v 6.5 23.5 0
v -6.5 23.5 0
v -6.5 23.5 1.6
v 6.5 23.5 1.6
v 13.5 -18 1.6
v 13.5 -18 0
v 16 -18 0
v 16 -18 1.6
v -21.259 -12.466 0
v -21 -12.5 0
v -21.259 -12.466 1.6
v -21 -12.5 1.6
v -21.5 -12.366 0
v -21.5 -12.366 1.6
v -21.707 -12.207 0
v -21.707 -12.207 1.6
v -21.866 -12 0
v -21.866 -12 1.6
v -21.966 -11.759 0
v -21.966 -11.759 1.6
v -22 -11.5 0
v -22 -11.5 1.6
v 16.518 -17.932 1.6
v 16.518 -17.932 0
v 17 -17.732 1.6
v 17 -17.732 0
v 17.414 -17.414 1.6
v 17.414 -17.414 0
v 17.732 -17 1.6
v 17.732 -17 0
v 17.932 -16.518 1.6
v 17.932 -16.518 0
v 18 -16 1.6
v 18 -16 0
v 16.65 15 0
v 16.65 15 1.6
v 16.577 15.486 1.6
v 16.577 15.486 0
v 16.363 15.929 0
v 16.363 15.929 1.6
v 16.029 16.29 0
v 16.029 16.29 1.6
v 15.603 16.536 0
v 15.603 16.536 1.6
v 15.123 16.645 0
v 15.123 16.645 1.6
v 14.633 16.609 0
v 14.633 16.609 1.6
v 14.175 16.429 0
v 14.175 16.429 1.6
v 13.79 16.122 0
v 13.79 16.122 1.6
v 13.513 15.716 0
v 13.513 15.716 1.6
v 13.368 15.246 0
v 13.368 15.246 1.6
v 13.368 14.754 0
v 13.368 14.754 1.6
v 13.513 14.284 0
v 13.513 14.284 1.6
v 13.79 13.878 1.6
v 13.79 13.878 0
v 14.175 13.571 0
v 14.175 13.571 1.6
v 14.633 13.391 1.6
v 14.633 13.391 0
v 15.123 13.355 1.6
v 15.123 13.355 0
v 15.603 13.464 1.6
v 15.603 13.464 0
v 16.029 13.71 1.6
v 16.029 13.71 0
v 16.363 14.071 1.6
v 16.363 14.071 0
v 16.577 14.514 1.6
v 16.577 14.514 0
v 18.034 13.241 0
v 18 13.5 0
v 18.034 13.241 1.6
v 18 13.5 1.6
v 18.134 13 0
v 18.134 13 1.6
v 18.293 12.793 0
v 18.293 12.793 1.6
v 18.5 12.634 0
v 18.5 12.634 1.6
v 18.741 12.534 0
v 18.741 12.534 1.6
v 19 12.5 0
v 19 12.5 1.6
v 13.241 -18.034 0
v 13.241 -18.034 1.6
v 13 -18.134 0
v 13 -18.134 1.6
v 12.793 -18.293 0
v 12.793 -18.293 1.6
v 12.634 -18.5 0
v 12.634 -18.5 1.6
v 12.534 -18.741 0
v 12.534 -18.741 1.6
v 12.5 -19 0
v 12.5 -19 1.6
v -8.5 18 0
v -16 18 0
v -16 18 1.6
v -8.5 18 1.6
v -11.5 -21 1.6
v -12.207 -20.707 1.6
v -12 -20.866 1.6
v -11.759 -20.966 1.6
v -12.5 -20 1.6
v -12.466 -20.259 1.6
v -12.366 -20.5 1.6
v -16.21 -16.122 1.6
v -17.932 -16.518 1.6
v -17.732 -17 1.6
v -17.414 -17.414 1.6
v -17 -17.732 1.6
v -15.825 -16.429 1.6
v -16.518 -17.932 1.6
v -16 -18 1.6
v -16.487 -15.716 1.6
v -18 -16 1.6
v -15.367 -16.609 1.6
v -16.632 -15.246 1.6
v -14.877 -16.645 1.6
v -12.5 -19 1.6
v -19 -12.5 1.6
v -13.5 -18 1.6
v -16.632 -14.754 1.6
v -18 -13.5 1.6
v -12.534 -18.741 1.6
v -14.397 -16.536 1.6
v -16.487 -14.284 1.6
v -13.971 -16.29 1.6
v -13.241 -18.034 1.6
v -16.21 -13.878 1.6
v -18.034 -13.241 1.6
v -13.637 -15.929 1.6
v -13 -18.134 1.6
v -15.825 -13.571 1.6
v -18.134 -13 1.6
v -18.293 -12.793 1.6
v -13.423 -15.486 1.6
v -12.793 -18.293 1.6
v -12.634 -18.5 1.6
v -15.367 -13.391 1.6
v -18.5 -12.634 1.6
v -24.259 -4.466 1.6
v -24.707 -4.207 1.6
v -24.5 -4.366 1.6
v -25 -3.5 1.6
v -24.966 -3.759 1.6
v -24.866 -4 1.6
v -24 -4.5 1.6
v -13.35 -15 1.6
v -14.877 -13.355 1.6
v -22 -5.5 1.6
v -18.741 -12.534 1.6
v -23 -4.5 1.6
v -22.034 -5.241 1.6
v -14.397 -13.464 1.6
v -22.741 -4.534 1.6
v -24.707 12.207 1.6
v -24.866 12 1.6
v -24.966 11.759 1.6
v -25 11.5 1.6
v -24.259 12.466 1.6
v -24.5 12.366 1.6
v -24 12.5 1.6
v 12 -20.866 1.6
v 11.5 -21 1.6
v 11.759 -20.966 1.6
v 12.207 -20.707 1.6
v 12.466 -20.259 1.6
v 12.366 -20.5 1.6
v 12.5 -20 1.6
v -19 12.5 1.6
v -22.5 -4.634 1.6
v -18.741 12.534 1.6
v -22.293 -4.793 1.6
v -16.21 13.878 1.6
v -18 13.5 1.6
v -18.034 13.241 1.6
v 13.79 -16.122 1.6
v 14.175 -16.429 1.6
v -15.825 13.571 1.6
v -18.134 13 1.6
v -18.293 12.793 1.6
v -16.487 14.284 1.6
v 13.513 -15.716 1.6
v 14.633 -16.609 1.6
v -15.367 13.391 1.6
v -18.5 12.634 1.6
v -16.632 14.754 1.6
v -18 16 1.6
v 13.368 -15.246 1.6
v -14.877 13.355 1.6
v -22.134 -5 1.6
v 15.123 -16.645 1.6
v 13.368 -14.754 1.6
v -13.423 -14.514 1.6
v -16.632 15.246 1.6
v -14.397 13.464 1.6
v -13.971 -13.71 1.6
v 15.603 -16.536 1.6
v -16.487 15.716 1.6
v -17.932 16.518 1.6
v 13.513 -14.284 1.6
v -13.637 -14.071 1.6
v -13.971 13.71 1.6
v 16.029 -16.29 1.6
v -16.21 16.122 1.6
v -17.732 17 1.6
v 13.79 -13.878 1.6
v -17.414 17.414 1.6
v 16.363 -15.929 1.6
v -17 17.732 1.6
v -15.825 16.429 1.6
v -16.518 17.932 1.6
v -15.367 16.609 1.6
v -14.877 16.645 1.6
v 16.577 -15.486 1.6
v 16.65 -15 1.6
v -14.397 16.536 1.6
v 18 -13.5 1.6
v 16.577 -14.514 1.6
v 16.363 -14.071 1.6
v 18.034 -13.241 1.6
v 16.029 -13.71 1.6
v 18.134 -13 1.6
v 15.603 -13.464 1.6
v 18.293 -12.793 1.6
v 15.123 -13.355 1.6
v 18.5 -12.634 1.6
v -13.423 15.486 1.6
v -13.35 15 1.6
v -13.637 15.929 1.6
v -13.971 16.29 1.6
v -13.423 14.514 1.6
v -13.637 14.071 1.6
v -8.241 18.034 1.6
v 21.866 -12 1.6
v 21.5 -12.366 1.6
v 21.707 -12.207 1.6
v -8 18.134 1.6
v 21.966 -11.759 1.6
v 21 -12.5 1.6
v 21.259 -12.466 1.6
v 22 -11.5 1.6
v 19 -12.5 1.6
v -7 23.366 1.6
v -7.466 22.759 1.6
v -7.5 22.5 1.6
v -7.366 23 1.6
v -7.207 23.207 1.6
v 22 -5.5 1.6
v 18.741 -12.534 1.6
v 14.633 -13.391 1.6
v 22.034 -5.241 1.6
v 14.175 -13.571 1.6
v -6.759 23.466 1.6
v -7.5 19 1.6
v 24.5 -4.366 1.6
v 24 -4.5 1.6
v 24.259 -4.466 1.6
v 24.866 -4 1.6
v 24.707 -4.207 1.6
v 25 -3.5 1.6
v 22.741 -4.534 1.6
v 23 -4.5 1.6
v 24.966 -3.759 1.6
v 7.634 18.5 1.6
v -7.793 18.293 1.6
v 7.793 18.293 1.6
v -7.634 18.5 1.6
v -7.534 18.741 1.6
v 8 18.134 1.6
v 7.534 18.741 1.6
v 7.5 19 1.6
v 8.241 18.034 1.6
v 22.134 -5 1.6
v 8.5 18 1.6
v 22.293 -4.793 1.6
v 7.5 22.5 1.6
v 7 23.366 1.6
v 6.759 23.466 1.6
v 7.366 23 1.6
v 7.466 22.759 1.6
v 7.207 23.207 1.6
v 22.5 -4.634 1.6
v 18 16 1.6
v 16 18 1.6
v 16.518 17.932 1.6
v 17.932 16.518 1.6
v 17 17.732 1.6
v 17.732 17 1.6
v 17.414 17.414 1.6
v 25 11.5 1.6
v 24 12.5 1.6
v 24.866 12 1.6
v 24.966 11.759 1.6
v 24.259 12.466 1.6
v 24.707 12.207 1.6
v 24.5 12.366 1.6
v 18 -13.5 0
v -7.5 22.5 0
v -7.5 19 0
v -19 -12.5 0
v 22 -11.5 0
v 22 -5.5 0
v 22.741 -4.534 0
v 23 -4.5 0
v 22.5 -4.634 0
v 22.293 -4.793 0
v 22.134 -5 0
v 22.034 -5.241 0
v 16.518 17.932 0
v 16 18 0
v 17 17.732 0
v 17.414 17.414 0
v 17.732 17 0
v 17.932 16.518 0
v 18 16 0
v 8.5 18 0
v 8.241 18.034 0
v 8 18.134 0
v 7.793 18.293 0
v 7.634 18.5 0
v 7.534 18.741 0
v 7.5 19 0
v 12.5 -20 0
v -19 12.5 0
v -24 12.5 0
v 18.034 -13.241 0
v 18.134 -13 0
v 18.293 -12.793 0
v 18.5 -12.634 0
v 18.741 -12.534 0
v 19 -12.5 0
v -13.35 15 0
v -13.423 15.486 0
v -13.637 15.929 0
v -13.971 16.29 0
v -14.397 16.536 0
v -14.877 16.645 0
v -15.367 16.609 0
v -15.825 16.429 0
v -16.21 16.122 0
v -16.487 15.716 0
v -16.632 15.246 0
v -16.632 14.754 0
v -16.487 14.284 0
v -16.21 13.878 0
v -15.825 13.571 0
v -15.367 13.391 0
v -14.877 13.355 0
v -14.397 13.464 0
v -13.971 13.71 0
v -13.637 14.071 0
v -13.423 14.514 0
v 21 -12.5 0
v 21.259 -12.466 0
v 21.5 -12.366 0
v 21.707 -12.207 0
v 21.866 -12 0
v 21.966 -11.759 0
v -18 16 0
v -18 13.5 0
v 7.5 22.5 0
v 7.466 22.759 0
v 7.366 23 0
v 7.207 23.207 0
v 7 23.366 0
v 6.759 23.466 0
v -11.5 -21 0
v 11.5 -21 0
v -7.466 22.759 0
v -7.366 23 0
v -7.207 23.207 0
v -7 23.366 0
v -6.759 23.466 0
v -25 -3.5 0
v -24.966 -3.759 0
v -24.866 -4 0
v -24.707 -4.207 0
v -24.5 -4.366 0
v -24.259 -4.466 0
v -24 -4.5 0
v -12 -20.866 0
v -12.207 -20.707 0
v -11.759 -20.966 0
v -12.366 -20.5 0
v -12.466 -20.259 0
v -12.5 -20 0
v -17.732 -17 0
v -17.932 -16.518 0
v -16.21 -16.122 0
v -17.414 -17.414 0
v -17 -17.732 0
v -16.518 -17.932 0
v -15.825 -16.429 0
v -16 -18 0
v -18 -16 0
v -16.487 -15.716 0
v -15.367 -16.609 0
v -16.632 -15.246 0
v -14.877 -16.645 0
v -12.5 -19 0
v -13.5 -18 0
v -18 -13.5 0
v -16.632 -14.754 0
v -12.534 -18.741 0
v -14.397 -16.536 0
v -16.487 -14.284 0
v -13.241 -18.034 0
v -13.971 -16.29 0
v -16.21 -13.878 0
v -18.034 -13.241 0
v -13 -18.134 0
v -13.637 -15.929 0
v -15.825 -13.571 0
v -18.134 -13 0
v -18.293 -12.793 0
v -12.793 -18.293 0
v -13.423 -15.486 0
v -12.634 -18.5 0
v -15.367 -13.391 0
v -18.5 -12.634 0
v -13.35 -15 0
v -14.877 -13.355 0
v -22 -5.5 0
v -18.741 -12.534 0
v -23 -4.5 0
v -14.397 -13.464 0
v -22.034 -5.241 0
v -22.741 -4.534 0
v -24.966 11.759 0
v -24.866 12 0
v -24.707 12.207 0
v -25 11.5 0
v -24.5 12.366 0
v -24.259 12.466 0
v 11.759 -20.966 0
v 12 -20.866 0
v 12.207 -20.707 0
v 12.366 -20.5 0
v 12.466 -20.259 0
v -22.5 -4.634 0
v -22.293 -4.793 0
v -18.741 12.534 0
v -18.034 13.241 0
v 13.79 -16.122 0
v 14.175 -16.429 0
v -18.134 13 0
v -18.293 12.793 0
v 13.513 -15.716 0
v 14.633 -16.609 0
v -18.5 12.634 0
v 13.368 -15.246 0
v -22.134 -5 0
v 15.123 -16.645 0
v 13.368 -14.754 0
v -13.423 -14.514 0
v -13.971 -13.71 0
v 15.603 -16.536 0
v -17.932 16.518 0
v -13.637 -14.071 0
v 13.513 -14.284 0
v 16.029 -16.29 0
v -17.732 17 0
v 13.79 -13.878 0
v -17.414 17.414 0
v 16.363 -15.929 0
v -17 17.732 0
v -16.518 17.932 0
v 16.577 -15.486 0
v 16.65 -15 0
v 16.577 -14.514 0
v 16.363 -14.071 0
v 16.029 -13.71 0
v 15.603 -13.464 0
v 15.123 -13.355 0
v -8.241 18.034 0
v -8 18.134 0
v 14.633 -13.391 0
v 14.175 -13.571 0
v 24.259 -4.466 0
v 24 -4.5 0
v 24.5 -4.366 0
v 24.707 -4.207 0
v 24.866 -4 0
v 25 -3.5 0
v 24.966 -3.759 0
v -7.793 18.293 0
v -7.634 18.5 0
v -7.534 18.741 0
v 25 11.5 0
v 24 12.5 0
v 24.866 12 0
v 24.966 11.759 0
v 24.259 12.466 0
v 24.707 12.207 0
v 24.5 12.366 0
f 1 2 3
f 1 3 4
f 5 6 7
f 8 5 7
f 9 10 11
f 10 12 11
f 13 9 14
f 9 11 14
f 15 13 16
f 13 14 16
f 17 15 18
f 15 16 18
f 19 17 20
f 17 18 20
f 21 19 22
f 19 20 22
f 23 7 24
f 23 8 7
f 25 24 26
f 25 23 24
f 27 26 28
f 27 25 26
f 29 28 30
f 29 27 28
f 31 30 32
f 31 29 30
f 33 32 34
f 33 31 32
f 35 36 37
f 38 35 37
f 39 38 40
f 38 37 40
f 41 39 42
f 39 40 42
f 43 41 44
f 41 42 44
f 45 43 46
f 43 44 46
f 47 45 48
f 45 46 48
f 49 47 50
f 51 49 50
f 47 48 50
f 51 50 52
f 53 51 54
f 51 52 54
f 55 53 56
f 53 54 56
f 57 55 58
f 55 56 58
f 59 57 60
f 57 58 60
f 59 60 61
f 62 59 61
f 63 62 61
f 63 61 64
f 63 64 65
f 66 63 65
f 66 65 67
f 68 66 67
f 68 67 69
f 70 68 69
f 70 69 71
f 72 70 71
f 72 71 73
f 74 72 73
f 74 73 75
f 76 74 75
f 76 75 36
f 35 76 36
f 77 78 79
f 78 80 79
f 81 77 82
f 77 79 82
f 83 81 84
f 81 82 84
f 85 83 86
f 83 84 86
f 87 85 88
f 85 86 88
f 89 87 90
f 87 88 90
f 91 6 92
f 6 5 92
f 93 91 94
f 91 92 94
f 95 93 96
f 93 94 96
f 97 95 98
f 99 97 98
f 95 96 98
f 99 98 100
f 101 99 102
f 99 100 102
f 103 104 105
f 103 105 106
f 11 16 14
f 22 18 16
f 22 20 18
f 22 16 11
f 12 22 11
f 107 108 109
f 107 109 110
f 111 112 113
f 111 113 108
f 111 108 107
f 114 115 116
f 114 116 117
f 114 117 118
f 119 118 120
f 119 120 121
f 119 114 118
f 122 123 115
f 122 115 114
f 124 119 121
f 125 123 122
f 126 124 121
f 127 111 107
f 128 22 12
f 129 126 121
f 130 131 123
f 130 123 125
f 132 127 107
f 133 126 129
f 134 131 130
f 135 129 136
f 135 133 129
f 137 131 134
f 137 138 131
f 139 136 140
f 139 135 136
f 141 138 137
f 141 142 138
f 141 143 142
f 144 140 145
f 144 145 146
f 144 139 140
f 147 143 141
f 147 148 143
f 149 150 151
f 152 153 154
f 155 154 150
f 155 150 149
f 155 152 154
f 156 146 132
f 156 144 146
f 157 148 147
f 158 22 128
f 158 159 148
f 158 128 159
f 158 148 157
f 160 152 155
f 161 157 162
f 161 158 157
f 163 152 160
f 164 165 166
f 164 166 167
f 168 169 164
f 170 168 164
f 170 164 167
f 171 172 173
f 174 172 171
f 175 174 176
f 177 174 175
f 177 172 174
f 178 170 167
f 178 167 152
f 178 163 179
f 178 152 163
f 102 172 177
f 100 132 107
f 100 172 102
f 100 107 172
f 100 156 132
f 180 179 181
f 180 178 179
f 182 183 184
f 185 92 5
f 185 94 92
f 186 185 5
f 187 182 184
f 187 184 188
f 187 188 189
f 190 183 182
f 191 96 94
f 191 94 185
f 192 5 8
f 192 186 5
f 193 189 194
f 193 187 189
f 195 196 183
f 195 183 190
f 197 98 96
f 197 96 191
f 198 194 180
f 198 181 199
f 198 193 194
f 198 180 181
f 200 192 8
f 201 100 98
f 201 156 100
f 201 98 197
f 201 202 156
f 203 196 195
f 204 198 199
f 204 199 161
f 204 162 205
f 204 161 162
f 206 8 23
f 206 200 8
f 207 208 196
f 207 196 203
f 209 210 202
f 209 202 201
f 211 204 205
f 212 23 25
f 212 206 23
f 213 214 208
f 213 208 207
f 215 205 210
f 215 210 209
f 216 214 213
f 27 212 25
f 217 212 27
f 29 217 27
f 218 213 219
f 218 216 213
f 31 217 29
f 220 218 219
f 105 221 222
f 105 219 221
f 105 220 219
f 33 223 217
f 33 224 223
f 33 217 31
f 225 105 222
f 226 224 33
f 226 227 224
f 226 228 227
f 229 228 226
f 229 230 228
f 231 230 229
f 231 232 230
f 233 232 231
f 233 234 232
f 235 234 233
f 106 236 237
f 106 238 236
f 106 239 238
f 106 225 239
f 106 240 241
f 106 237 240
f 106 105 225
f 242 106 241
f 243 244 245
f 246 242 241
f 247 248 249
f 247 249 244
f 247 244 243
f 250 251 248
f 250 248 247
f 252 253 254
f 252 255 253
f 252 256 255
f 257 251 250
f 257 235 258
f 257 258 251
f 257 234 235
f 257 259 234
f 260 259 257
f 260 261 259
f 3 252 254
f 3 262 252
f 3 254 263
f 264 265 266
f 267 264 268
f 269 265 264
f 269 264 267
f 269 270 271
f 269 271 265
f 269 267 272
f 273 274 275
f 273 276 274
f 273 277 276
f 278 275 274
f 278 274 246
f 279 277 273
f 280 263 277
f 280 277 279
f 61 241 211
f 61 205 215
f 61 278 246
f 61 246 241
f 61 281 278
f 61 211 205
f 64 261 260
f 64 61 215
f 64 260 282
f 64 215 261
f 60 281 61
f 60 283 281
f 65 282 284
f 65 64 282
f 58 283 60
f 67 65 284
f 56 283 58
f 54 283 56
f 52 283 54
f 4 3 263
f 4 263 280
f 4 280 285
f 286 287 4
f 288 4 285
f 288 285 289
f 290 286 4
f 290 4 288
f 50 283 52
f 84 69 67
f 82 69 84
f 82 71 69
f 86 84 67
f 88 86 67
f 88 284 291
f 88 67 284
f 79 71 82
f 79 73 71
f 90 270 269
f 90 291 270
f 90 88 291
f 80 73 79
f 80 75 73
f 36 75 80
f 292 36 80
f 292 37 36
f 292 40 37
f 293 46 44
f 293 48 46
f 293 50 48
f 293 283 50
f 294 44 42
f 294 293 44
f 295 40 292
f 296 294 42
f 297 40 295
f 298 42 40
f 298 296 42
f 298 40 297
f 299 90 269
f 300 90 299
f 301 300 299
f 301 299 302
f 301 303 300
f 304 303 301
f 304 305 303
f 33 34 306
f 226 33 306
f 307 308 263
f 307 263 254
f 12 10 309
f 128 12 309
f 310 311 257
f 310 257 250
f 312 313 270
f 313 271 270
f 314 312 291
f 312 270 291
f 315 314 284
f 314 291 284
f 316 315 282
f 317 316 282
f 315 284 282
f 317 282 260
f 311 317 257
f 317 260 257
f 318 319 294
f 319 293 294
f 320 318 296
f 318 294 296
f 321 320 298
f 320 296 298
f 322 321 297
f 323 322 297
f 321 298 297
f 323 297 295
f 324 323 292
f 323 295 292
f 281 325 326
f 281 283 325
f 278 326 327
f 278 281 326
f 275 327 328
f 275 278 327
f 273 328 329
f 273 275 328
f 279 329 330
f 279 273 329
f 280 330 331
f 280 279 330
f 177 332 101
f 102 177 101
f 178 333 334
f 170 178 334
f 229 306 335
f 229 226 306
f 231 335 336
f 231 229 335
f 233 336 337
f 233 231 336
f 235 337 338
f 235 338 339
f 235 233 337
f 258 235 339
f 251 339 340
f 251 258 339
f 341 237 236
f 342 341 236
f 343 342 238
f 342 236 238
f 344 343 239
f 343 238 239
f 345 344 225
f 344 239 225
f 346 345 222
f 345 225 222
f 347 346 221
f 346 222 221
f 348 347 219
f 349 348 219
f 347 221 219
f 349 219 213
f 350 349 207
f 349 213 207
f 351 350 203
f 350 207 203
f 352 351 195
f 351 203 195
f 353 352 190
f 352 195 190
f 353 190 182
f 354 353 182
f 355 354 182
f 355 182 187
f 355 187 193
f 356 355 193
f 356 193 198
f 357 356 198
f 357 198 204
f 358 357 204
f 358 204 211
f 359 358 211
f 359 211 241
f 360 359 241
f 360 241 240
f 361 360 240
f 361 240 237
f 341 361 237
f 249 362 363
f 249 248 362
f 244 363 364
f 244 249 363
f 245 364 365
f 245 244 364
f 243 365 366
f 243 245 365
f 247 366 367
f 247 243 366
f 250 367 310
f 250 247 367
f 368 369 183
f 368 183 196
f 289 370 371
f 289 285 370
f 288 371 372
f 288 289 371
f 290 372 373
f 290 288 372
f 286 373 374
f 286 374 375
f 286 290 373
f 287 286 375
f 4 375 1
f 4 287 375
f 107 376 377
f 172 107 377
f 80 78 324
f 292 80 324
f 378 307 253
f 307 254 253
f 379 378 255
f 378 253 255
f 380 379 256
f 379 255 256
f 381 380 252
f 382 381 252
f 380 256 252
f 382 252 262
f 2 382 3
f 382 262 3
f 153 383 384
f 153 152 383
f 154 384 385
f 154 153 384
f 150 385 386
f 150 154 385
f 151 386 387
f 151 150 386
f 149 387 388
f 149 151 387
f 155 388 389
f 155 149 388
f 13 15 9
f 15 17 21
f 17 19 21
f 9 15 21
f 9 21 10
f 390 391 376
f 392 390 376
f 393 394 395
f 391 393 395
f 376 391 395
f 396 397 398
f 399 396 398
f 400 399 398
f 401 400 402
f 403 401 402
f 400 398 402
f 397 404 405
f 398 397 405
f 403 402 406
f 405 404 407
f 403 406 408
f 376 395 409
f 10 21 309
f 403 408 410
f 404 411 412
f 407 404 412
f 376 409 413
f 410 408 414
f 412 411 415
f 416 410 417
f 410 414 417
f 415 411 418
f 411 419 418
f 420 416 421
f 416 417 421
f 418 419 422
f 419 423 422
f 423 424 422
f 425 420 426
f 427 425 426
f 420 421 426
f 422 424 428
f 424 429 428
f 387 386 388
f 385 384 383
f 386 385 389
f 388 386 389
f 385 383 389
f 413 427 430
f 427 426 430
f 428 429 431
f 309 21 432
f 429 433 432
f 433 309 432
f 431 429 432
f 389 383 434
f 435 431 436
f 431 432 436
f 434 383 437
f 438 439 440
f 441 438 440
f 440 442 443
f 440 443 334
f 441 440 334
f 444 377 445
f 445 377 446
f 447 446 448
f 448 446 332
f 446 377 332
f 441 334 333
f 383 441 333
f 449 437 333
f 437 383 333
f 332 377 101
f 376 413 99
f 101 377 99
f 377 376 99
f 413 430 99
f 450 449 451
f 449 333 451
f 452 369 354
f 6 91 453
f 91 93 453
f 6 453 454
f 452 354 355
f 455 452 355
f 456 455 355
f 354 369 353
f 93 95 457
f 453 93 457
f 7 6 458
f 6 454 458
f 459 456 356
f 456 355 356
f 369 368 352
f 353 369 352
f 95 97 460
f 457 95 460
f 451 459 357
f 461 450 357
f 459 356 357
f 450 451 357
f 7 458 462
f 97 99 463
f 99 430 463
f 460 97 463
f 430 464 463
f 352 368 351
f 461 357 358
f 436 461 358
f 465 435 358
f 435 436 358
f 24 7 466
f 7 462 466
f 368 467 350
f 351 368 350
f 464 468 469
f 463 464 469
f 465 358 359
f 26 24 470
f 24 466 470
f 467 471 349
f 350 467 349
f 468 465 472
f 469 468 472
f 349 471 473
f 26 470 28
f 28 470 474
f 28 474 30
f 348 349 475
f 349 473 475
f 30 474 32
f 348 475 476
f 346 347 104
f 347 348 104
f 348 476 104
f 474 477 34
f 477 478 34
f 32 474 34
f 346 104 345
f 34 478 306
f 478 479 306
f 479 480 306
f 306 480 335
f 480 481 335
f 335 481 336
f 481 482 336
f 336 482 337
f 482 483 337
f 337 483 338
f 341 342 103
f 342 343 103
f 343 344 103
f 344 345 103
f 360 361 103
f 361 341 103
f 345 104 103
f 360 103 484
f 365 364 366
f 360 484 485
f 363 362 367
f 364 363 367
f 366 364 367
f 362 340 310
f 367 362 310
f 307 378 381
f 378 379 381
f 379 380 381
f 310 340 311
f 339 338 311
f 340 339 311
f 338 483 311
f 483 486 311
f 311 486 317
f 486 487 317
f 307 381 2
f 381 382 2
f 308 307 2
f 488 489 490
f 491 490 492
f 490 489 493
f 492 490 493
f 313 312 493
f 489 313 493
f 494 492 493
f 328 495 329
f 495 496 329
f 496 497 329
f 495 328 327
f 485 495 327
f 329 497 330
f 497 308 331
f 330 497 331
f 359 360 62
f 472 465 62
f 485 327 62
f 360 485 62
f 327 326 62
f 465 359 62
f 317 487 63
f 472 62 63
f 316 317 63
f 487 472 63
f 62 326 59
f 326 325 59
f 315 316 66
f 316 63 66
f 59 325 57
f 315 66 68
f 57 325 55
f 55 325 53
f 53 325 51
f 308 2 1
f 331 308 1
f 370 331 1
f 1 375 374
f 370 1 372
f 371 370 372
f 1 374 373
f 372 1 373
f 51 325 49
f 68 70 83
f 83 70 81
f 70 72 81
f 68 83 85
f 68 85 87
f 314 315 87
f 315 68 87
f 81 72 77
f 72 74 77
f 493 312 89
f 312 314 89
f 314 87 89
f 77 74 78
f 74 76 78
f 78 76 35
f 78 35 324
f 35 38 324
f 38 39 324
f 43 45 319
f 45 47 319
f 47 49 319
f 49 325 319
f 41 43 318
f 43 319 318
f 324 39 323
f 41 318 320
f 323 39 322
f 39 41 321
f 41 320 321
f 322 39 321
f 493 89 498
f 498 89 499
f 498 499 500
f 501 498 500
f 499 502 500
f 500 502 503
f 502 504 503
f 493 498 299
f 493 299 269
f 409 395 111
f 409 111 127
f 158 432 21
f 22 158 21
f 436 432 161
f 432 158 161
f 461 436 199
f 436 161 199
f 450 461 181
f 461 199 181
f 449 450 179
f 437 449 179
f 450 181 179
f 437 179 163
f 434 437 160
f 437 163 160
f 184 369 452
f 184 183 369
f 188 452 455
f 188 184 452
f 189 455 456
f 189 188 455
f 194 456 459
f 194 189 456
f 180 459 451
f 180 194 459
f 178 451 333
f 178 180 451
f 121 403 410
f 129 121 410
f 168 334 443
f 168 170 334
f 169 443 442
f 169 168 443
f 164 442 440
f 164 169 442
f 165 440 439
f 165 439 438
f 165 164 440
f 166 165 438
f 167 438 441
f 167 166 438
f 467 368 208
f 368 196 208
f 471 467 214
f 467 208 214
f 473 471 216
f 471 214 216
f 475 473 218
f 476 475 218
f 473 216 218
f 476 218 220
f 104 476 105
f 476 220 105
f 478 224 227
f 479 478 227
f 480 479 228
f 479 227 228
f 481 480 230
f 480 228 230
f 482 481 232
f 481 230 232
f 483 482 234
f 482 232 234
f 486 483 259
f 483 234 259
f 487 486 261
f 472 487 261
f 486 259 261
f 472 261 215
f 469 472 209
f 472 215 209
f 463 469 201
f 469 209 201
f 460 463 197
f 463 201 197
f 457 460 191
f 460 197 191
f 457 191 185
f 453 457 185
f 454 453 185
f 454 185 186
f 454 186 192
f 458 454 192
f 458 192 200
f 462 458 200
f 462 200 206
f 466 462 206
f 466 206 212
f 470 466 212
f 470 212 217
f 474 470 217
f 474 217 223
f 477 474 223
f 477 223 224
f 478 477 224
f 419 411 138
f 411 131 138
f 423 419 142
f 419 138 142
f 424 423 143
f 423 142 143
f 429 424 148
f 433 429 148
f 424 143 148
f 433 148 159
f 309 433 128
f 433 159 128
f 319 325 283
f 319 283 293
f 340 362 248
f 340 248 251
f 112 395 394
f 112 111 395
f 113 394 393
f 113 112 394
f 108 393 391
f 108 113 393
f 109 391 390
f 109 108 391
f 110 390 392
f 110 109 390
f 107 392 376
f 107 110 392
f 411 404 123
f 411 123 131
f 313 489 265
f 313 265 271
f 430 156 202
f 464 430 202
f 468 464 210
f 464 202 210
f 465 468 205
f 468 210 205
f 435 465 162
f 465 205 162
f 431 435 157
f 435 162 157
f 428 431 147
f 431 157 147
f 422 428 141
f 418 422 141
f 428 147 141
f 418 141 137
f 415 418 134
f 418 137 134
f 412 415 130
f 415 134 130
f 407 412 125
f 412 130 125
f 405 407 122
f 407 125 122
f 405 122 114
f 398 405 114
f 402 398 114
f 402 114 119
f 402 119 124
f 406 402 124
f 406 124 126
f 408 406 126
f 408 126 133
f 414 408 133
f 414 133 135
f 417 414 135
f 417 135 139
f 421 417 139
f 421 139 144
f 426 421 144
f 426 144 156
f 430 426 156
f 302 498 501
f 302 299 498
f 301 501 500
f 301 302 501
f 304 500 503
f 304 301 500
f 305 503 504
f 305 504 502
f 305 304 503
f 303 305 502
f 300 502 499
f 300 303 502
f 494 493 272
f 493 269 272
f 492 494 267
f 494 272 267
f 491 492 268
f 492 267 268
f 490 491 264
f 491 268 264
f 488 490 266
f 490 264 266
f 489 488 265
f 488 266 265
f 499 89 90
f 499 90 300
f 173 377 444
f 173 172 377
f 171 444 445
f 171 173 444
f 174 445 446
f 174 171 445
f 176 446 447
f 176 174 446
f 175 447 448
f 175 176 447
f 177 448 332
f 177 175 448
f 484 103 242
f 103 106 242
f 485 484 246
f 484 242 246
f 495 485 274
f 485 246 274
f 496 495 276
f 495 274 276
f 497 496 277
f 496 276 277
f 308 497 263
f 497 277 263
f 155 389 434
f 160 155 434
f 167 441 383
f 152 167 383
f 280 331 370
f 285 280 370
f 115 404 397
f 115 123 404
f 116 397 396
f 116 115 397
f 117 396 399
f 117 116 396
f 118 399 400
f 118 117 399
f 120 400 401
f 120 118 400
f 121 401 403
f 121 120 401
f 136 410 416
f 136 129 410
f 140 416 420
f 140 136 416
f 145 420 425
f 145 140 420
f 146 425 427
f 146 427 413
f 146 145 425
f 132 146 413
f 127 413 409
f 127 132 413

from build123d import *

# Parameters (mm, degrees)
SKETCH_1_W               = 36
SKETCH_1_H               = 36
BODY_DEPTH               = 1.6
SKETCH_2_R               = 1.65
BOLTHOLE_M3_PILLAR_DEPTH = 26.506077707
FILLET_1_R               = 2
SKETCH_4_W               = 15
SKETCH_4_H               = 5.5
SKETCH_4_W_2             = 25
SKETCH_4_H_2             = 3
CONNECTORS_POWER_DEPTH   = 1.6
FILLET_3_R               = 1


with BuildPart() as part:
    # 스케치1 → Body (new body)
    with BuildSketch(Plane.XY):
        Rectangle(SKETCH_1_W, SKETCH_1_H)
    extrude(amount=BODY_DEPTH)

    # 스케치2 → BoltHole_M3_pillar (cut, through all)
    with BuildSketch(Plane.XY.offset(1.6)):
        with Locations((-15, 15)):
            Circle(SKETCH_2_R)
        with Locations((15, 15)):
            Circle(SKETCH_2_R)
        with Locations((15, -15)):
            Circle(SKETCH_2_R)
        with Locations((-15, -15)):
            Circle(SKETCH_2_R)
    extrude(amount=-BOLTHOLE_M3_PILLAR_DEPTH, mode=Mode.SUBTRACT)

    # 필렛1
    fillet_1_edges = [part.edges().sort_by_distance(p)[0] for p in [
        (-18, 18, 0.8),
        (18, 18, 0.8),
        (18, -18, 0.8),
        (-18, -18, 0.8),
    ]]
    fillet(fillet_1_edges, radius=FILLET_1_R)

    # 스케치4 → Connectors_power (add)
    with BuildSketch(Plane.XY):
        Polygon((-18, 12.5), (-25, 12.5), (-25, -4.5), (-22, -4.5), (-22, -12.5), (-18, -12.5), (-18, -4.5), align=None)
        Polygon((25, 12.5), (25, -4.5), (22, -4.5), (22, -12.5), (18, -12.5), (18, -4.5), (18, 12.5), align=None)
        with Locations((0, 20.75)):
            Rectangle(SKETCH_4_W, SKETCH_4_H)
        with Locations((0, -19.5)):
            Rectangle(SKETCH_4_W_2, SKETCH_4_H_2)
    extrude(amount=CONNECTORS_POWER_DEPTH)

    # 필렛3
    fillet_3_edges = [part.edges().sort_by_distance(p)[0] for p in [
        (12.5, -18, 0.8),
        (12.5, -21, 0.8),
        (-12.5, -21, 0.8),
        (-12.5, -18, 0.8),
        (-18, -12.5, 0.8),
        (-22, -12.5, 0.8),
        (-22, -4.5, 0.8),
        (-25, -4.5, 0.8),
        (-25, 12.5, 0.8),
        (-18, 12.5, 0.8),
        (25, -4.5, 0.8),
        (22, -4.5, 0.8),
        (22, -12.5, 0.8),
        (18, -12.5, 0.8),
        (18, 12.5, 0.8),
        (25, 12.5, 0.8),
        (7.5, 23.5, 0.8),
        (7.5, 18, 0.8),
        (-7.5, 18, 0.8),
        (-7.5, 23.5, 0.8),
    ]]
    fillet(fillet_3_edges, radius=FILLET_3_R)


solid = part.part
